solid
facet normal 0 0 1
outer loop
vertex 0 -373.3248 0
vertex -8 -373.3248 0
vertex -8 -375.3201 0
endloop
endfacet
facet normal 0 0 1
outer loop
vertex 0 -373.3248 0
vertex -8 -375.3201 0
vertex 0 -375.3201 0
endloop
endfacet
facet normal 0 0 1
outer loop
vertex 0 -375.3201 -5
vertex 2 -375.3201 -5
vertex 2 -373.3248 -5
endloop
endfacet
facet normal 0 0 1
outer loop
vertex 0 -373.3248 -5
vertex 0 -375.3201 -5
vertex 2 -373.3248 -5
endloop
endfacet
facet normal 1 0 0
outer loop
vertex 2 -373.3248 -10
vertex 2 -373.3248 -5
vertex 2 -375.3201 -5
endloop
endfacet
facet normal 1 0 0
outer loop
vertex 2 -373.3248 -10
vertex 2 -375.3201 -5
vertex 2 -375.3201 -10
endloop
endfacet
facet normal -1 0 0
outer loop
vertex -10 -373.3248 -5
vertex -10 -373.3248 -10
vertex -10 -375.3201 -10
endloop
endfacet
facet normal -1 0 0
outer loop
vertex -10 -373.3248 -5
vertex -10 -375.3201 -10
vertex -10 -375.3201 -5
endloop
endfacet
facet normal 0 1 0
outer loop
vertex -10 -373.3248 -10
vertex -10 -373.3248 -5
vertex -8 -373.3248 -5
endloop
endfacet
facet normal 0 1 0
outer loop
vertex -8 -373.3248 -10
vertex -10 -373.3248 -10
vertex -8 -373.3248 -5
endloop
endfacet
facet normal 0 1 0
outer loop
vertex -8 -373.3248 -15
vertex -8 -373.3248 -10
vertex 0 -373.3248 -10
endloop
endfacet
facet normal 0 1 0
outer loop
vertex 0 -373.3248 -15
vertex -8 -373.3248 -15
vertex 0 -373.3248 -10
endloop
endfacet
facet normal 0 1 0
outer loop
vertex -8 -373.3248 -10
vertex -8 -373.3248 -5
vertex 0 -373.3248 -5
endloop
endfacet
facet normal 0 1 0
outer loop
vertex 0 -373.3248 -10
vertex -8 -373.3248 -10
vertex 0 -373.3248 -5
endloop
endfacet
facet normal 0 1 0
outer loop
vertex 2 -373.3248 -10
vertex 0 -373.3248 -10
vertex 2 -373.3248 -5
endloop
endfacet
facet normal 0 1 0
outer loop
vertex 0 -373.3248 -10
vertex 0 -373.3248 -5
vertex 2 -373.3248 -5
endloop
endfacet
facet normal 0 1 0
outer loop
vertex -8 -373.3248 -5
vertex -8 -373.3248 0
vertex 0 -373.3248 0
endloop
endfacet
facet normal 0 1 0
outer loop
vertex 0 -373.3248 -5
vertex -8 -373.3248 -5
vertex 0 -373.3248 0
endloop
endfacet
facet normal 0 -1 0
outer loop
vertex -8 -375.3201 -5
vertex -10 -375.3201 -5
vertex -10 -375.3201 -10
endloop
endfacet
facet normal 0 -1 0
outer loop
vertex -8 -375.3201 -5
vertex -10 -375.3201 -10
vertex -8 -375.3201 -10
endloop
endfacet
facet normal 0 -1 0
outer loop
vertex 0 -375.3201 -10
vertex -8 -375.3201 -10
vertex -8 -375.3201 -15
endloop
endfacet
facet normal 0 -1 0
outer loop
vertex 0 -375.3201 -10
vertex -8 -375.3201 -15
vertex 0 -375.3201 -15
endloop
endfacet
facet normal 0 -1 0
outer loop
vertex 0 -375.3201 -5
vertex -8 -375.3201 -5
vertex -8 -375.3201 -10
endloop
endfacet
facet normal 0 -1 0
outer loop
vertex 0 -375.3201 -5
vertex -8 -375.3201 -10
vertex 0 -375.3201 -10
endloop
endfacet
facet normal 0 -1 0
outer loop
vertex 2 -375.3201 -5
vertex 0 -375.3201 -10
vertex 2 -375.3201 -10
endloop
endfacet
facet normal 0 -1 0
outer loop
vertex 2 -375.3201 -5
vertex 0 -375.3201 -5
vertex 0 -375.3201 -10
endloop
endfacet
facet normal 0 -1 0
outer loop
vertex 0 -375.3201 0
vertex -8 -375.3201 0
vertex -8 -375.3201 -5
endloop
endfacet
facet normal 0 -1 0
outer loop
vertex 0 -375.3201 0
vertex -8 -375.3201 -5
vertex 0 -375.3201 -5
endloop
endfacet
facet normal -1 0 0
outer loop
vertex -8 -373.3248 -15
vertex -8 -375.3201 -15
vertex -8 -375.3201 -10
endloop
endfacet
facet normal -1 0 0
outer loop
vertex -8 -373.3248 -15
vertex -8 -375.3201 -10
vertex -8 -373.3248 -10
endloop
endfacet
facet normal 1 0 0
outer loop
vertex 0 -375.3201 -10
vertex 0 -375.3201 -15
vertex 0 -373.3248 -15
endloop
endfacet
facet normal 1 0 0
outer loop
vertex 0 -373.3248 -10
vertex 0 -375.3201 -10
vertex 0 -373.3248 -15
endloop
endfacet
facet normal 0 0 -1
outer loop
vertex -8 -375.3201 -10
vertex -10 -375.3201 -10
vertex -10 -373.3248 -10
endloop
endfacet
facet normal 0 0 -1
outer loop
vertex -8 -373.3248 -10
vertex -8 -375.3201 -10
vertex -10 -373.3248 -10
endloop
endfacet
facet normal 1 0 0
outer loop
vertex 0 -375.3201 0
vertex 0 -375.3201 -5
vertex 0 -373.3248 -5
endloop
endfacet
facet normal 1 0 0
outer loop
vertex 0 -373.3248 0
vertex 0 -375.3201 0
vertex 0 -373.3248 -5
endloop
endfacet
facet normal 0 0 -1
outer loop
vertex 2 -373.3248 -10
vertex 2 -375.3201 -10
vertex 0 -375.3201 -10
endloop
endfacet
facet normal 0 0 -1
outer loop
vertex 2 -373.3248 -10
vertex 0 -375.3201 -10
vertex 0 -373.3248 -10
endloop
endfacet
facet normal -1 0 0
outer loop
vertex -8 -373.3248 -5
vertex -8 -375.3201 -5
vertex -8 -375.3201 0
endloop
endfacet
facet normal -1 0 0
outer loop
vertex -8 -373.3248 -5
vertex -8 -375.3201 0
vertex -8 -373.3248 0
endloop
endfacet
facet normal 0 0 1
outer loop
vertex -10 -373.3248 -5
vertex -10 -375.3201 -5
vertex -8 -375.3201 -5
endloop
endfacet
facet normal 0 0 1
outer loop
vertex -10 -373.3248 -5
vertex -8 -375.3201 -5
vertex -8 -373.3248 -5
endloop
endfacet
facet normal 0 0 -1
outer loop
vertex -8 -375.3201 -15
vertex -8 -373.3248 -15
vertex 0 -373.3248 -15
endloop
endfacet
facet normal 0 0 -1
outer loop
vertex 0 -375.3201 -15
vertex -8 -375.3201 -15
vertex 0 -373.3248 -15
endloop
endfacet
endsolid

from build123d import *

# Parameters (mm, degrees)
SZKIC1_W                    = 8
SZKIC1_H                    = 1.995325655
DODANIE_WYCI_GNI_CIE1_DEPTH = 15
SZKIC3_W                    = 5
SZKIC3_H                    = 1.995325655
DODANIE_WYCI_GNI_CIE2_DEPTH = 2
SZKIC5_W                    = 5
SZKIC5_H                    = 1.995325655
DODANIE_WYCI_GNI_CIE3_DEPTH = 2


with BuildPart() as part:
    # Szkic1 → Dodanie-wyciągnięcie1 (new body)
    with BuildSketch(Plane.XY):
        with Locations((-4, -374.322437992)):
            Rectangle(SZKIC1_W, SZKIC1_H)
    extrude(amount=-DODANIE_WYCI_GNI_CIE1_DEPTH)

    # Szkic3 → Dodanie-wyciągnięcie2 (add)
    with BuildSketch(Plane.ZY.offset(8)):
        with Locations((-7.5, -374.322437992)):
            Rectangle(SZKIC3_W, SZKIC3_H)
    extrude(amount=DODANIE_WYCI_GNI_CIE2_DEPTH)

    # Szkic5 → Dodanie-wyciągnięcie3 (add)
    with BuildSketch(Plane(origin=(0, 0, 0), x_dir=(0, 0, -1), z_dir=(1, 0, 0))):
        with Locations((7.5, -374.322437992)):
            Rectangle(SZKIC5_W, SZKIC5_H)
    extrude(amount=DODANIE_WYCI_GNI_CIE3_DEPTH)


solid = part.part
